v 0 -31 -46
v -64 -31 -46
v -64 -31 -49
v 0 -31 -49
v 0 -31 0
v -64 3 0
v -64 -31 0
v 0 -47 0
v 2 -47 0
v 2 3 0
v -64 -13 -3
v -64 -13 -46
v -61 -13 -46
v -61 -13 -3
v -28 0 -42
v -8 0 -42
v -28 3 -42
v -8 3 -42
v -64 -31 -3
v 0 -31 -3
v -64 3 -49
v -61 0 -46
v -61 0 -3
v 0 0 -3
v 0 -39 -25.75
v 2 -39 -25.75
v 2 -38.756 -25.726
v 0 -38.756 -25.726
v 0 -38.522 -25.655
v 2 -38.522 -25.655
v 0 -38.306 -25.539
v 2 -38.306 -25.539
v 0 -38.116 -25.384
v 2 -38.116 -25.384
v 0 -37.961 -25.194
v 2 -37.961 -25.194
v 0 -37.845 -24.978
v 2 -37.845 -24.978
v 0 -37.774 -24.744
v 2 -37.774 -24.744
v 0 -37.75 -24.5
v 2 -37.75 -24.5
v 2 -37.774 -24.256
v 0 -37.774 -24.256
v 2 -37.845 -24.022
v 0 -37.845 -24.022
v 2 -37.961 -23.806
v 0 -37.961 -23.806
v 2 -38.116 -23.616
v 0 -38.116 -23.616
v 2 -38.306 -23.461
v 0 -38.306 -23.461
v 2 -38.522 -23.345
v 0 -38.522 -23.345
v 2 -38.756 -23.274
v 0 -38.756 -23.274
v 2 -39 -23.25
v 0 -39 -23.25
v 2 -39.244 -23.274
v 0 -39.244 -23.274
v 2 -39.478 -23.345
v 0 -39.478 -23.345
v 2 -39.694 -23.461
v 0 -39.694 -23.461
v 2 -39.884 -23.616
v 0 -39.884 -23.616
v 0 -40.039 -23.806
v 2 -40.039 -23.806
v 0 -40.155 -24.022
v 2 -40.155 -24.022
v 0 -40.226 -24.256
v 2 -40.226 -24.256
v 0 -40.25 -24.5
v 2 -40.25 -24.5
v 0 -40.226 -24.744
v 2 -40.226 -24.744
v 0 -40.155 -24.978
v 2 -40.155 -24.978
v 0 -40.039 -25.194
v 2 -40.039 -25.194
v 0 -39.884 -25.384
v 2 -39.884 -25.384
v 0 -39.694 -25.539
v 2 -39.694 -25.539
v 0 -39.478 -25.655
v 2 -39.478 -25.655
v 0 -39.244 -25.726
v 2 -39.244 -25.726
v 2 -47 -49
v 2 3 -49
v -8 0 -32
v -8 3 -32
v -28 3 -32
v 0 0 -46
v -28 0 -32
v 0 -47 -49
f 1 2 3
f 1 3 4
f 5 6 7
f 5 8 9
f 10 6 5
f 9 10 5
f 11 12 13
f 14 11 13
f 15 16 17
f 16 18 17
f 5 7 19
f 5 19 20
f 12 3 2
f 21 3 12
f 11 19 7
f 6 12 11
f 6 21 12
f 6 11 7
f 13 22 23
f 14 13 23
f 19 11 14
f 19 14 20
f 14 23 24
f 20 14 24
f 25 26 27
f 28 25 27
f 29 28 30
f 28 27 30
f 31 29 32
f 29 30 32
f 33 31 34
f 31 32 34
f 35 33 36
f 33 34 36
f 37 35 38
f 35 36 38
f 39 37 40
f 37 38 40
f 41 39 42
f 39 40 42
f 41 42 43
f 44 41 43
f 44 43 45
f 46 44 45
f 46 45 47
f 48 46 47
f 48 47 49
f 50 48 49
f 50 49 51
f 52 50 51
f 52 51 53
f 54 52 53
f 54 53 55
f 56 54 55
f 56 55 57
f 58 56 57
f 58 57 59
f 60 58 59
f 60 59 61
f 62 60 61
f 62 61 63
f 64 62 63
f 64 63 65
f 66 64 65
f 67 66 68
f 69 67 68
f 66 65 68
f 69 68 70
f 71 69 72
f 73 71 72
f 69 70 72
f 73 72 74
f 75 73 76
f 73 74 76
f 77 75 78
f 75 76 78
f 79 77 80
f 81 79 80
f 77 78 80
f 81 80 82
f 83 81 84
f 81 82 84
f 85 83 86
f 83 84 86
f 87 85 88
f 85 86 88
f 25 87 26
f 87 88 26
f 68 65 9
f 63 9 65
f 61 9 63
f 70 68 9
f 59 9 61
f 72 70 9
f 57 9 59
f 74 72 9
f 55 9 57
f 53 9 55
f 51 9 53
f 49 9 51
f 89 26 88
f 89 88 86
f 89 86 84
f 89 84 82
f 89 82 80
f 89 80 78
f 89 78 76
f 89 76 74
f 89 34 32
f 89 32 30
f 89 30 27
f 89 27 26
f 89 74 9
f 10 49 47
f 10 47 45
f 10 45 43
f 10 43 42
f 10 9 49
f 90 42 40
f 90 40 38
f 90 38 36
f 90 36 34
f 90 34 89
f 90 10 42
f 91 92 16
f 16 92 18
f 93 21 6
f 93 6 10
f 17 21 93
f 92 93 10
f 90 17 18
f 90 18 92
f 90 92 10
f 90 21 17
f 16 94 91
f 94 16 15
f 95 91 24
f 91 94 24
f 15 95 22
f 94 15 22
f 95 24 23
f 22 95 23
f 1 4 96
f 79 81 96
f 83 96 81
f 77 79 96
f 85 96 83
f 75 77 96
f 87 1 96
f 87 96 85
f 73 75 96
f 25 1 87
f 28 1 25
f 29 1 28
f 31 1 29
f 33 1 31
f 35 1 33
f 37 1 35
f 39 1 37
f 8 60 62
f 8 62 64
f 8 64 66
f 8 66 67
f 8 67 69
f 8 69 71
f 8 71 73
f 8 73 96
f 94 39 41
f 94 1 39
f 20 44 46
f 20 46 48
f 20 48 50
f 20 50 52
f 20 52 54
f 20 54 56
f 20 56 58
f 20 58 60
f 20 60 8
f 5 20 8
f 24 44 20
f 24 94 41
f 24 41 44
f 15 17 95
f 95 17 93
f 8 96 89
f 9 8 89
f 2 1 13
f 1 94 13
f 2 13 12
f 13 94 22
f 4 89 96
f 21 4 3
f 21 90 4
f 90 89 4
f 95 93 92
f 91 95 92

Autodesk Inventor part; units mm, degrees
ref_plane "YZ Plane" through (0, 0, 0) normal (1, 0, 0) x (0, 1, 0)
ref_plane "XZ Plane" through (0, 0, 0) normal (0, 1, 0) x (-1, 0, 0)
ref_plane "XY Plane" through (0, 0, 0) normal (0, 0, 1) x (1, 0, 0)
sketch "Sketch94" plane through (0, 0, 0) normal (0, 1, 0) x (-1, 0, 0)
  line L0 (0, 0) -> (64, 0)
  line L1 (64, 0) -> (64, -49)
  line L2 (64, -49) -> (0, -49)
  line L3 (0, -49) -> (0, 0)
  dimension "d270" = 64
  dimension "d271" = 49
extrude "Extrusion51" add sketch "Sketch94" along normal blind 3
sketch "Sketch96" plane through (0, 0, 0) normal (0, -1, 0) x (1, 0, 0)
  line L0 (-64, 0) -> (0, 0) projected
  line L1 (0, 0) -> (-64, 0)
  line L2 (-64, 0) -> (-64, -3)
  line L3 (-64, -49) -> (-64, 0) projected
  line L4 (-64, -3) -> (0, -3)
  line L5 (0, -3) -> (0, 0)
  dimension "d274" = 3
extrude "Extrusion52" add sketch "Sketch96" along normal blind 31
sketch "Sketch97" plane through (0, 0, 0) normal (0, -1, 0) x (1, 0, 0)
  line L0 (0, -49) -> (-64, -49) projected
  line L1 (0, -49) -> (0, -46)
  line L2 (0, 0) -> (0, -49) projected
  line L3 (0, -46) -> (-64, -46)
  line L4 (-64, -49) -> (-64, 0) projected
  line L5 (-64, -49) -> (0, -49)
  dimension "d277" = 3
extrude "Extrusion53" add sketch "Sketch97" along normal blind 31
sketch "Sketch98" plane through (0, 3, 0) normal (0, 1, 0) x (1, 0, 0)
  line L0 (-64, 49) -> (0, 49) projected
  line L1 (0, 49) -> (-8, 49)
  line L2 (-8, 49) -> (-8, 42)
  line L3 (-8, 42) -> (0, 42)
  line L4 (0, 42) -> (0, 49)
  line L5 (-8, 42) -> (-28, 42)
  line L6 (-28, 42) -> (-28, 32)
  line L7 (-28, 32) -> (-8, 32)
  line L8 (-8, 32) -> (-8, 42)
  point P0 (0, 0)
  dimension "d280" = 8
  dimension "d281" = 7
  dimension "d282" = 20
  dimension "d283" = 10
extrude "Extrusion54" cut sketch "Sketch98" against normal blind 31 contours L8 L7 L6 L5
sketch "Sketch99" plane through (0, 3, 0) normal (0, 1, 0) x (1, 0, 0)
  line L0 (0, 0) -> (2, 0)
  line L1 (2, 0) -> (2, 49)
  line L2 (2, 49) -> (0, 49)
  line L3 (0, 49) -> (0, 0)
  dimension "d286" = 2
  dimension "d287" = 49
extrude "Extrusion55" add sketch "Sketch99" against normal blind 50
sketch "Sketch100" plane through (0, 0, 0) normal (0, -1, 0) x (1, 0, 0)
  line L0 (-64, -46) -> (-64, -3) projected
  line L1 (-64, -3) -> (0, -3) projected
  line L2 (-64, -46) -> (-61, -46)
  line L3 (-61, -46) -> (-61, -3)
  line L4 (-61, -3) -> (-64, -3)
  line L5 (-64, -3) -> (-64, -46)
  point P0 (0, 0)
  dimension "d290" = 3
extrude "Extrusion56" add sketch "Sketch100" along normal blind 13
sketch "Sketch101" plane through (2, 3, 0) normal (1, 0, 0) x (0, 0, -1)
  line L0 (0, -50) -> (49, -50) projected
  line L1 (0, -50) -> (24.5, -50)
  line L2 (24.5, -50) -> (24.5, -42)
  circle A0 centre (24.5, -42) radius 1.25
  point P0 (0, -3)
  dimension "d293" = 24.5
  dimension "d294" = 8
  dimension "d295" = 2.5
extrude "Extrusion57" cut sketch "Sketch101" against normal blind 13
properties part number "Back"
